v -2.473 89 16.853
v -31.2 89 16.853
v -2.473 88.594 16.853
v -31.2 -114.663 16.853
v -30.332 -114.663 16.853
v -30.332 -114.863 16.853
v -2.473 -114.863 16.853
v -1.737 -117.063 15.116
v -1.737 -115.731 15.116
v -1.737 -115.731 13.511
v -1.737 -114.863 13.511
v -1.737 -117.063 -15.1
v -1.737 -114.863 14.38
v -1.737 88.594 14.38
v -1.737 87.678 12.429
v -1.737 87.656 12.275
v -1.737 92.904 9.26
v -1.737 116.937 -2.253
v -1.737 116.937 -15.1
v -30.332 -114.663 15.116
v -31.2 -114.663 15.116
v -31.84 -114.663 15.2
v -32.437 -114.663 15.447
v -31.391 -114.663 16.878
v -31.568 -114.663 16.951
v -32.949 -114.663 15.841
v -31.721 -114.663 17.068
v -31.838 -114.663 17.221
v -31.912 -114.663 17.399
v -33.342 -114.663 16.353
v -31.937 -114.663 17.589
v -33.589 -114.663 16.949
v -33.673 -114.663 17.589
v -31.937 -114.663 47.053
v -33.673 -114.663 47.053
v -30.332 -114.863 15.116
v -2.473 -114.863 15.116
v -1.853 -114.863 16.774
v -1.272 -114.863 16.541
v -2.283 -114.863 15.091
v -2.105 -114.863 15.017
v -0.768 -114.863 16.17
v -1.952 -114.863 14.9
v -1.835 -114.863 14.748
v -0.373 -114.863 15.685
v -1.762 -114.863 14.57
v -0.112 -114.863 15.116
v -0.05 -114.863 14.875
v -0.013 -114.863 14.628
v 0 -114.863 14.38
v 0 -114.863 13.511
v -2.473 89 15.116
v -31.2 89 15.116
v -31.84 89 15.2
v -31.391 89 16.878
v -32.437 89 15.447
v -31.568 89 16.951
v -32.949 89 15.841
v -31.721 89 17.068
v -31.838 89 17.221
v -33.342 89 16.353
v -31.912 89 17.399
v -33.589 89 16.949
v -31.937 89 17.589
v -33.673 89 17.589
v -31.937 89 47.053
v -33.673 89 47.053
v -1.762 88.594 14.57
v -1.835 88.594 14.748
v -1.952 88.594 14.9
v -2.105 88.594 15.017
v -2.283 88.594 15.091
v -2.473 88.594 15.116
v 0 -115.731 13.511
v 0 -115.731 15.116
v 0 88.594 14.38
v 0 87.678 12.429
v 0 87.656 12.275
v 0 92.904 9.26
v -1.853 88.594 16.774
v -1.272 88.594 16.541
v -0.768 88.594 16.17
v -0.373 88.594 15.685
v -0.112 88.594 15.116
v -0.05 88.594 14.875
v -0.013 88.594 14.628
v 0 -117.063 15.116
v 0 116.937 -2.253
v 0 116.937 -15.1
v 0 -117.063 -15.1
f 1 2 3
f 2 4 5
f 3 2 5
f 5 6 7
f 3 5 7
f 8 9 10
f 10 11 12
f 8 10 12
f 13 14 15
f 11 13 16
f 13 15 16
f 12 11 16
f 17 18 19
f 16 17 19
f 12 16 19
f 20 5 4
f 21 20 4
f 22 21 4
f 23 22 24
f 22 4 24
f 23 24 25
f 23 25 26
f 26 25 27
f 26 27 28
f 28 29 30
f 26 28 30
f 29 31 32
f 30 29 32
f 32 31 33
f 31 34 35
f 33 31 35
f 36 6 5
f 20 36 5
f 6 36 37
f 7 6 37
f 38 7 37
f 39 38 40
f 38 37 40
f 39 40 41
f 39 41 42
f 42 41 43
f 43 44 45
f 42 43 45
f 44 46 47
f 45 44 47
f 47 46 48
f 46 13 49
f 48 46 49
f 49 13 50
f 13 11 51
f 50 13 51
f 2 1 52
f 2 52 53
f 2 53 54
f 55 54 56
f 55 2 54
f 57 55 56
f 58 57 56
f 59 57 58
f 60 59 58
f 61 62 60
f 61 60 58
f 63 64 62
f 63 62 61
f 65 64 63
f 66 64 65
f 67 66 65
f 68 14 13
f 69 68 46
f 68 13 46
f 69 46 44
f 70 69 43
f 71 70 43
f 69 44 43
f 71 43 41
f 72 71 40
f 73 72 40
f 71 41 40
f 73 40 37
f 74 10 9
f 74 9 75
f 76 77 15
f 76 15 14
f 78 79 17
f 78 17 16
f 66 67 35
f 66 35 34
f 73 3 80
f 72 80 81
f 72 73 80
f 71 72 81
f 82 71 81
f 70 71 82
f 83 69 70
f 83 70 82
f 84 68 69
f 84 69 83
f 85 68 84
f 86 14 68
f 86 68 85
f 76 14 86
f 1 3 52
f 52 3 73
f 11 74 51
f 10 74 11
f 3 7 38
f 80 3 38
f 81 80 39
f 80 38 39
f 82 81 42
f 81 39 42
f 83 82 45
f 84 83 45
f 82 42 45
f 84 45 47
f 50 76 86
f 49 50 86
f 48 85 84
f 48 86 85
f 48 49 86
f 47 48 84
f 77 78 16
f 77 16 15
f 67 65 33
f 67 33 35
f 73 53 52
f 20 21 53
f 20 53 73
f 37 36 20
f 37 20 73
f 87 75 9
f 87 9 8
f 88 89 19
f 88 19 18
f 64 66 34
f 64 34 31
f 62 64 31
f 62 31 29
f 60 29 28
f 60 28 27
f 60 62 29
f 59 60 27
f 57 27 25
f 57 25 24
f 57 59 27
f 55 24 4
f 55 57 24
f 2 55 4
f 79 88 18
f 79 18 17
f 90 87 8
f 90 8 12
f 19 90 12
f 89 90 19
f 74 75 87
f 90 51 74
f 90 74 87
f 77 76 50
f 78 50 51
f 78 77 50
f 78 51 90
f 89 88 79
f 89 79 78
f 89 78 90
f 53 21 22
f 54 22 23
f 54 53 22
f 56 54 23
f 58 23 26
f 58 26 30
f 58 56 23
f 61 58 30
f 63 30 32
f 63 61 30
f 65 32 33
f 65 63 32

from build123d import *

# Parameters (mm, degrees)
BASE_FLANGE1_DEPTH            = 1.7366
EDGE_FLANGE1_START            = -115.730831119
EDGE_FLANGE1_DEPTH            = 204.671095583
EDGE_FLANGE1_2_DEPTH          = 0.8683
EDGE_FLANGE1_START_2          = 88.594139894
EDGE_FLANGE1_3_DEPTH          = 0.34612457
EDGE_FLANGE1_START_3          = -114.862531119
EDGE_FLANGE1_4_DEPTH          = 203.456671013
EDGE_FLANGE1_5_OUTLINE_W      = 29.4634
EDGE_FLANGE1_5_OUTLINE_H      = 1.7366
EDGE_FLANGE1_5_DEPTH          = 0.405860106
EDGE_FLANGE2_STRIP_W          = 8.4196
EDGE_FLANGE2_STRIP_H          = 1.7366
EDGE_FLANGE2_STRIP_CUT_DEPTH  = 203.662531119
EDGE_FLANGE2_RELIEF_W         = 9.2879
EDGE_FLANGE2_RELIEF_H         = 0.8683
EDGE_FLANGE2_RELIEF_CUT_DEPTH = 1.7366
EDGE_FLANGE2_DEPTH            = 203.662531119


# Read off the part's stored shape, not the designer's step: Edge-Flange1
# Sheet-metal steps are written as plain solids
with BuildPart() as part:
    # Sketch1 → Base-Flange1 (new body)
    with BuildSketch(Plane(origin=(0, 0, 0), x_dir=(0, 0, -1), z_dir=(1, 0, 0))):
        Polygon((2.253419205, 116.937468881), (-9.259888049, 92.904226435), (-12.275167803, 87.656070952), (-12.429418016, 87.67778326), (-15.116149142, 88.940264464), (-15.116149142, -117.062531119), (15.1, -117.062531119), (15.1, 116.937468881), align=None)
    extrude(amount=-BASE_FLANGE1_DEPTH)

    # Edge-Flange1 outline → Edge-Flange1 (cut)
    with BuildSketch(Plane(origin=(0, 0, 0), x_dir=(1, 0, 0), z_dir=(0, 1, 0)).offset(EDGE_FLANGE1_START)):
        with BuildLine():
            Line((0, -15.116149142), (0, -14.379549142))
            ThreePointArc((0, -14.379549142), (-0.02822066, -14.752100167), (-0.112238611, -15.116149142))
            Line((-0.112238611, -15.116149142), (0, -15.116149142))
        make_face()
    extrude(amount=EDGE_FLANGE1_DEPTH, mode=Mode.SUBTRACT)

    # Edge-Flange1 2 outline → Edge-Flange1 2 (cut)
    with BuildSketch(Plane(origin=(0, 0, 0), x_dir=(1, 0, 0), z_dir=(0, 1, 0)).offset(EDGE_FLANGE1_START)):
        with BuildLine():
            Line((0, -13.511249142), (-1.7366, -13.511249142))
            Line((-1.7366, -13.511249142), (-1.7366, -15.116149142))
            Line((-1.7366, -15.116149142), (-0.112238611, -15.116149142))
            ThreePointArc((-0.112238611, -15.116149142), (-0.02822066, -14.752100167), (0, -14.379549142))
            Line((0, -14.379549142), (0, -13.511249142))
        make_face()
    extrude(amount=EDGE_FLANGE1_2_DEPTH, mode=Mode.SUBTRACT)

    # Edge-Flange1 3 outline → Edge-Flange1 3 (cut)
    with BuildSketch(Plane(origin=(0, 0, 0), x_dir=(1, 0, 0), z_dir=(0, 1, 0)).offset(EDGE_FLANGE1_START_2)):
        with BuildLine():
            Line((0, -13.511249142), (-1.7366, -13.511249142))
            Line((-1.7366, -13.511249142), (-1.7366, -15.116149142))
            Line((-1.7366, -15.116149142), (-0.112238611, -15.116149142))
            ThreePointArc((-0.112238611, -15.116149142), (-0.02822066, -14.752100167), (0, -14.379549142))
            Line((0, -14.379549142), (0, -13.511249142))
        make_face()
    extrude(amount=EDGE_FLANGE1_3_DEPTH, mode=Mode.SUBTRACT)

    # Edge-Flange1 4 outline → Edge-Flange1 4 (add)
    with BuildSketch(Plane(origin=(0, 0, 0), x_dir=(1, 0, 0), z_dir=(0, 1, 0)).offset(EDGE_FLANGE1_START_3)):
        with BuildLine():
            Line((-1.7366, -15.116149142), (-1.7366, -14.379549142))
            ThreePointArc((-1.7366, -14.379549142), (-1.952345145, -14.900403997), (-2.4732, -15.116149142))
            Line((-2.4732, -15.116149142), (-31.9366, -15.116149142))
            Line((-31.9366, -15.116149142), (-31.9366, -16.852749142))
            Line((-31.9366, -16.852749142), (-2.4732, -16.852749142))
            ThreePointArc((-2.4732, -16.852749142), (-1.007771885, -16.371843969), (-0.112238611, -15.116149142))
            Line((-0.112238611, -15.116149142), (-1.7366, -15.116149142))
        make_face()
    extrude(amount=EDGE_FLANGE1_4_DEPTH)

    # Edge-Flange1 5 outline → Edge-Flange1 5 (add)
    with BuildSketch(Plane(origin=(0, 0, 0), x_dir=(1, 0, 0), z_dir=(0, 1, 0)).offset(EDGE_FLANGE1_START_2)):
        with Locations((-17.2049, -15.984449142)):
            Rectangle(EDGE_FLANGE1_5_OUTLINE_W, EDGE_FLANGE1_5_OUTLINE_H)
    extrude(amount=EDGE_FLANGE1_5_DEPTH)

    # Edge-Flange2 strip (across the edge) → Edge-Flange2 strip cut (cut)
    with BuildSketch(Plane(origin=(-31.9366, 89, 16.852749142), x_dir=(1, 0, 0), z_dir=(0, -1, 0))):
        with Locations((-3.4732, -0.8683)):
            Rectangle(EDGE_FLANGE2_STRIP_W, EDGE_FLANGE2_STRIP_H)
    extrude(amount=EDGE_FLANGE2_STRIP_CUT_DEPTH, mode=Mode.SUBTRACT)

    # Edge-Flange2 relief (on the sheet) → Edge-Flange2 relief cut (cut)
    with BuildSketch(Plane(origin=(-31.2, 89, 16.852749142), x_dir=(1, 0, 0), z_dir=(0, 0, 1))):
        with Locations((-3.77565, -204.096681119)):
            Rectangle(EDGE_FLANGE2_RELIEF_W, EDGE_FLANGE2_RELIEF_H)
    extrude(amount=-EDGE_FLANGE2_RELIEF_CUT_DEPTH, mode=Mode.SUBTRACT)

    # Edge-Flange2 section (across the edge) → Edge-Flange2 (add)
    with BuildSketch(Plane(origin=(-31.9366, 89, 16.852749142), x_dir=(1, 0, 0), z_dir=(0, -1, 0))):
        with BuildLine():
            Line((-1.7366, 0.7366), (-1.7366, 30.2))
            Line((-1.7366, 30.2), (0, 30.2))
            Line((0, 30.2), (0, 0.7366))
            ThreePointArc((0, 0.7366), (0.215745145, 0.215745145), (0.7366, 0))
            Line((0.7366, 0), (0.7366, -1.7366))
            ThreePointArc((0.7366, -1.7366), (-1.012216491, -1.012216491), (-1.7366, 0.7366))
        make_face()
    extrude(amount=EDGE_FLANGE2_DEPTH)


solid = part.part
